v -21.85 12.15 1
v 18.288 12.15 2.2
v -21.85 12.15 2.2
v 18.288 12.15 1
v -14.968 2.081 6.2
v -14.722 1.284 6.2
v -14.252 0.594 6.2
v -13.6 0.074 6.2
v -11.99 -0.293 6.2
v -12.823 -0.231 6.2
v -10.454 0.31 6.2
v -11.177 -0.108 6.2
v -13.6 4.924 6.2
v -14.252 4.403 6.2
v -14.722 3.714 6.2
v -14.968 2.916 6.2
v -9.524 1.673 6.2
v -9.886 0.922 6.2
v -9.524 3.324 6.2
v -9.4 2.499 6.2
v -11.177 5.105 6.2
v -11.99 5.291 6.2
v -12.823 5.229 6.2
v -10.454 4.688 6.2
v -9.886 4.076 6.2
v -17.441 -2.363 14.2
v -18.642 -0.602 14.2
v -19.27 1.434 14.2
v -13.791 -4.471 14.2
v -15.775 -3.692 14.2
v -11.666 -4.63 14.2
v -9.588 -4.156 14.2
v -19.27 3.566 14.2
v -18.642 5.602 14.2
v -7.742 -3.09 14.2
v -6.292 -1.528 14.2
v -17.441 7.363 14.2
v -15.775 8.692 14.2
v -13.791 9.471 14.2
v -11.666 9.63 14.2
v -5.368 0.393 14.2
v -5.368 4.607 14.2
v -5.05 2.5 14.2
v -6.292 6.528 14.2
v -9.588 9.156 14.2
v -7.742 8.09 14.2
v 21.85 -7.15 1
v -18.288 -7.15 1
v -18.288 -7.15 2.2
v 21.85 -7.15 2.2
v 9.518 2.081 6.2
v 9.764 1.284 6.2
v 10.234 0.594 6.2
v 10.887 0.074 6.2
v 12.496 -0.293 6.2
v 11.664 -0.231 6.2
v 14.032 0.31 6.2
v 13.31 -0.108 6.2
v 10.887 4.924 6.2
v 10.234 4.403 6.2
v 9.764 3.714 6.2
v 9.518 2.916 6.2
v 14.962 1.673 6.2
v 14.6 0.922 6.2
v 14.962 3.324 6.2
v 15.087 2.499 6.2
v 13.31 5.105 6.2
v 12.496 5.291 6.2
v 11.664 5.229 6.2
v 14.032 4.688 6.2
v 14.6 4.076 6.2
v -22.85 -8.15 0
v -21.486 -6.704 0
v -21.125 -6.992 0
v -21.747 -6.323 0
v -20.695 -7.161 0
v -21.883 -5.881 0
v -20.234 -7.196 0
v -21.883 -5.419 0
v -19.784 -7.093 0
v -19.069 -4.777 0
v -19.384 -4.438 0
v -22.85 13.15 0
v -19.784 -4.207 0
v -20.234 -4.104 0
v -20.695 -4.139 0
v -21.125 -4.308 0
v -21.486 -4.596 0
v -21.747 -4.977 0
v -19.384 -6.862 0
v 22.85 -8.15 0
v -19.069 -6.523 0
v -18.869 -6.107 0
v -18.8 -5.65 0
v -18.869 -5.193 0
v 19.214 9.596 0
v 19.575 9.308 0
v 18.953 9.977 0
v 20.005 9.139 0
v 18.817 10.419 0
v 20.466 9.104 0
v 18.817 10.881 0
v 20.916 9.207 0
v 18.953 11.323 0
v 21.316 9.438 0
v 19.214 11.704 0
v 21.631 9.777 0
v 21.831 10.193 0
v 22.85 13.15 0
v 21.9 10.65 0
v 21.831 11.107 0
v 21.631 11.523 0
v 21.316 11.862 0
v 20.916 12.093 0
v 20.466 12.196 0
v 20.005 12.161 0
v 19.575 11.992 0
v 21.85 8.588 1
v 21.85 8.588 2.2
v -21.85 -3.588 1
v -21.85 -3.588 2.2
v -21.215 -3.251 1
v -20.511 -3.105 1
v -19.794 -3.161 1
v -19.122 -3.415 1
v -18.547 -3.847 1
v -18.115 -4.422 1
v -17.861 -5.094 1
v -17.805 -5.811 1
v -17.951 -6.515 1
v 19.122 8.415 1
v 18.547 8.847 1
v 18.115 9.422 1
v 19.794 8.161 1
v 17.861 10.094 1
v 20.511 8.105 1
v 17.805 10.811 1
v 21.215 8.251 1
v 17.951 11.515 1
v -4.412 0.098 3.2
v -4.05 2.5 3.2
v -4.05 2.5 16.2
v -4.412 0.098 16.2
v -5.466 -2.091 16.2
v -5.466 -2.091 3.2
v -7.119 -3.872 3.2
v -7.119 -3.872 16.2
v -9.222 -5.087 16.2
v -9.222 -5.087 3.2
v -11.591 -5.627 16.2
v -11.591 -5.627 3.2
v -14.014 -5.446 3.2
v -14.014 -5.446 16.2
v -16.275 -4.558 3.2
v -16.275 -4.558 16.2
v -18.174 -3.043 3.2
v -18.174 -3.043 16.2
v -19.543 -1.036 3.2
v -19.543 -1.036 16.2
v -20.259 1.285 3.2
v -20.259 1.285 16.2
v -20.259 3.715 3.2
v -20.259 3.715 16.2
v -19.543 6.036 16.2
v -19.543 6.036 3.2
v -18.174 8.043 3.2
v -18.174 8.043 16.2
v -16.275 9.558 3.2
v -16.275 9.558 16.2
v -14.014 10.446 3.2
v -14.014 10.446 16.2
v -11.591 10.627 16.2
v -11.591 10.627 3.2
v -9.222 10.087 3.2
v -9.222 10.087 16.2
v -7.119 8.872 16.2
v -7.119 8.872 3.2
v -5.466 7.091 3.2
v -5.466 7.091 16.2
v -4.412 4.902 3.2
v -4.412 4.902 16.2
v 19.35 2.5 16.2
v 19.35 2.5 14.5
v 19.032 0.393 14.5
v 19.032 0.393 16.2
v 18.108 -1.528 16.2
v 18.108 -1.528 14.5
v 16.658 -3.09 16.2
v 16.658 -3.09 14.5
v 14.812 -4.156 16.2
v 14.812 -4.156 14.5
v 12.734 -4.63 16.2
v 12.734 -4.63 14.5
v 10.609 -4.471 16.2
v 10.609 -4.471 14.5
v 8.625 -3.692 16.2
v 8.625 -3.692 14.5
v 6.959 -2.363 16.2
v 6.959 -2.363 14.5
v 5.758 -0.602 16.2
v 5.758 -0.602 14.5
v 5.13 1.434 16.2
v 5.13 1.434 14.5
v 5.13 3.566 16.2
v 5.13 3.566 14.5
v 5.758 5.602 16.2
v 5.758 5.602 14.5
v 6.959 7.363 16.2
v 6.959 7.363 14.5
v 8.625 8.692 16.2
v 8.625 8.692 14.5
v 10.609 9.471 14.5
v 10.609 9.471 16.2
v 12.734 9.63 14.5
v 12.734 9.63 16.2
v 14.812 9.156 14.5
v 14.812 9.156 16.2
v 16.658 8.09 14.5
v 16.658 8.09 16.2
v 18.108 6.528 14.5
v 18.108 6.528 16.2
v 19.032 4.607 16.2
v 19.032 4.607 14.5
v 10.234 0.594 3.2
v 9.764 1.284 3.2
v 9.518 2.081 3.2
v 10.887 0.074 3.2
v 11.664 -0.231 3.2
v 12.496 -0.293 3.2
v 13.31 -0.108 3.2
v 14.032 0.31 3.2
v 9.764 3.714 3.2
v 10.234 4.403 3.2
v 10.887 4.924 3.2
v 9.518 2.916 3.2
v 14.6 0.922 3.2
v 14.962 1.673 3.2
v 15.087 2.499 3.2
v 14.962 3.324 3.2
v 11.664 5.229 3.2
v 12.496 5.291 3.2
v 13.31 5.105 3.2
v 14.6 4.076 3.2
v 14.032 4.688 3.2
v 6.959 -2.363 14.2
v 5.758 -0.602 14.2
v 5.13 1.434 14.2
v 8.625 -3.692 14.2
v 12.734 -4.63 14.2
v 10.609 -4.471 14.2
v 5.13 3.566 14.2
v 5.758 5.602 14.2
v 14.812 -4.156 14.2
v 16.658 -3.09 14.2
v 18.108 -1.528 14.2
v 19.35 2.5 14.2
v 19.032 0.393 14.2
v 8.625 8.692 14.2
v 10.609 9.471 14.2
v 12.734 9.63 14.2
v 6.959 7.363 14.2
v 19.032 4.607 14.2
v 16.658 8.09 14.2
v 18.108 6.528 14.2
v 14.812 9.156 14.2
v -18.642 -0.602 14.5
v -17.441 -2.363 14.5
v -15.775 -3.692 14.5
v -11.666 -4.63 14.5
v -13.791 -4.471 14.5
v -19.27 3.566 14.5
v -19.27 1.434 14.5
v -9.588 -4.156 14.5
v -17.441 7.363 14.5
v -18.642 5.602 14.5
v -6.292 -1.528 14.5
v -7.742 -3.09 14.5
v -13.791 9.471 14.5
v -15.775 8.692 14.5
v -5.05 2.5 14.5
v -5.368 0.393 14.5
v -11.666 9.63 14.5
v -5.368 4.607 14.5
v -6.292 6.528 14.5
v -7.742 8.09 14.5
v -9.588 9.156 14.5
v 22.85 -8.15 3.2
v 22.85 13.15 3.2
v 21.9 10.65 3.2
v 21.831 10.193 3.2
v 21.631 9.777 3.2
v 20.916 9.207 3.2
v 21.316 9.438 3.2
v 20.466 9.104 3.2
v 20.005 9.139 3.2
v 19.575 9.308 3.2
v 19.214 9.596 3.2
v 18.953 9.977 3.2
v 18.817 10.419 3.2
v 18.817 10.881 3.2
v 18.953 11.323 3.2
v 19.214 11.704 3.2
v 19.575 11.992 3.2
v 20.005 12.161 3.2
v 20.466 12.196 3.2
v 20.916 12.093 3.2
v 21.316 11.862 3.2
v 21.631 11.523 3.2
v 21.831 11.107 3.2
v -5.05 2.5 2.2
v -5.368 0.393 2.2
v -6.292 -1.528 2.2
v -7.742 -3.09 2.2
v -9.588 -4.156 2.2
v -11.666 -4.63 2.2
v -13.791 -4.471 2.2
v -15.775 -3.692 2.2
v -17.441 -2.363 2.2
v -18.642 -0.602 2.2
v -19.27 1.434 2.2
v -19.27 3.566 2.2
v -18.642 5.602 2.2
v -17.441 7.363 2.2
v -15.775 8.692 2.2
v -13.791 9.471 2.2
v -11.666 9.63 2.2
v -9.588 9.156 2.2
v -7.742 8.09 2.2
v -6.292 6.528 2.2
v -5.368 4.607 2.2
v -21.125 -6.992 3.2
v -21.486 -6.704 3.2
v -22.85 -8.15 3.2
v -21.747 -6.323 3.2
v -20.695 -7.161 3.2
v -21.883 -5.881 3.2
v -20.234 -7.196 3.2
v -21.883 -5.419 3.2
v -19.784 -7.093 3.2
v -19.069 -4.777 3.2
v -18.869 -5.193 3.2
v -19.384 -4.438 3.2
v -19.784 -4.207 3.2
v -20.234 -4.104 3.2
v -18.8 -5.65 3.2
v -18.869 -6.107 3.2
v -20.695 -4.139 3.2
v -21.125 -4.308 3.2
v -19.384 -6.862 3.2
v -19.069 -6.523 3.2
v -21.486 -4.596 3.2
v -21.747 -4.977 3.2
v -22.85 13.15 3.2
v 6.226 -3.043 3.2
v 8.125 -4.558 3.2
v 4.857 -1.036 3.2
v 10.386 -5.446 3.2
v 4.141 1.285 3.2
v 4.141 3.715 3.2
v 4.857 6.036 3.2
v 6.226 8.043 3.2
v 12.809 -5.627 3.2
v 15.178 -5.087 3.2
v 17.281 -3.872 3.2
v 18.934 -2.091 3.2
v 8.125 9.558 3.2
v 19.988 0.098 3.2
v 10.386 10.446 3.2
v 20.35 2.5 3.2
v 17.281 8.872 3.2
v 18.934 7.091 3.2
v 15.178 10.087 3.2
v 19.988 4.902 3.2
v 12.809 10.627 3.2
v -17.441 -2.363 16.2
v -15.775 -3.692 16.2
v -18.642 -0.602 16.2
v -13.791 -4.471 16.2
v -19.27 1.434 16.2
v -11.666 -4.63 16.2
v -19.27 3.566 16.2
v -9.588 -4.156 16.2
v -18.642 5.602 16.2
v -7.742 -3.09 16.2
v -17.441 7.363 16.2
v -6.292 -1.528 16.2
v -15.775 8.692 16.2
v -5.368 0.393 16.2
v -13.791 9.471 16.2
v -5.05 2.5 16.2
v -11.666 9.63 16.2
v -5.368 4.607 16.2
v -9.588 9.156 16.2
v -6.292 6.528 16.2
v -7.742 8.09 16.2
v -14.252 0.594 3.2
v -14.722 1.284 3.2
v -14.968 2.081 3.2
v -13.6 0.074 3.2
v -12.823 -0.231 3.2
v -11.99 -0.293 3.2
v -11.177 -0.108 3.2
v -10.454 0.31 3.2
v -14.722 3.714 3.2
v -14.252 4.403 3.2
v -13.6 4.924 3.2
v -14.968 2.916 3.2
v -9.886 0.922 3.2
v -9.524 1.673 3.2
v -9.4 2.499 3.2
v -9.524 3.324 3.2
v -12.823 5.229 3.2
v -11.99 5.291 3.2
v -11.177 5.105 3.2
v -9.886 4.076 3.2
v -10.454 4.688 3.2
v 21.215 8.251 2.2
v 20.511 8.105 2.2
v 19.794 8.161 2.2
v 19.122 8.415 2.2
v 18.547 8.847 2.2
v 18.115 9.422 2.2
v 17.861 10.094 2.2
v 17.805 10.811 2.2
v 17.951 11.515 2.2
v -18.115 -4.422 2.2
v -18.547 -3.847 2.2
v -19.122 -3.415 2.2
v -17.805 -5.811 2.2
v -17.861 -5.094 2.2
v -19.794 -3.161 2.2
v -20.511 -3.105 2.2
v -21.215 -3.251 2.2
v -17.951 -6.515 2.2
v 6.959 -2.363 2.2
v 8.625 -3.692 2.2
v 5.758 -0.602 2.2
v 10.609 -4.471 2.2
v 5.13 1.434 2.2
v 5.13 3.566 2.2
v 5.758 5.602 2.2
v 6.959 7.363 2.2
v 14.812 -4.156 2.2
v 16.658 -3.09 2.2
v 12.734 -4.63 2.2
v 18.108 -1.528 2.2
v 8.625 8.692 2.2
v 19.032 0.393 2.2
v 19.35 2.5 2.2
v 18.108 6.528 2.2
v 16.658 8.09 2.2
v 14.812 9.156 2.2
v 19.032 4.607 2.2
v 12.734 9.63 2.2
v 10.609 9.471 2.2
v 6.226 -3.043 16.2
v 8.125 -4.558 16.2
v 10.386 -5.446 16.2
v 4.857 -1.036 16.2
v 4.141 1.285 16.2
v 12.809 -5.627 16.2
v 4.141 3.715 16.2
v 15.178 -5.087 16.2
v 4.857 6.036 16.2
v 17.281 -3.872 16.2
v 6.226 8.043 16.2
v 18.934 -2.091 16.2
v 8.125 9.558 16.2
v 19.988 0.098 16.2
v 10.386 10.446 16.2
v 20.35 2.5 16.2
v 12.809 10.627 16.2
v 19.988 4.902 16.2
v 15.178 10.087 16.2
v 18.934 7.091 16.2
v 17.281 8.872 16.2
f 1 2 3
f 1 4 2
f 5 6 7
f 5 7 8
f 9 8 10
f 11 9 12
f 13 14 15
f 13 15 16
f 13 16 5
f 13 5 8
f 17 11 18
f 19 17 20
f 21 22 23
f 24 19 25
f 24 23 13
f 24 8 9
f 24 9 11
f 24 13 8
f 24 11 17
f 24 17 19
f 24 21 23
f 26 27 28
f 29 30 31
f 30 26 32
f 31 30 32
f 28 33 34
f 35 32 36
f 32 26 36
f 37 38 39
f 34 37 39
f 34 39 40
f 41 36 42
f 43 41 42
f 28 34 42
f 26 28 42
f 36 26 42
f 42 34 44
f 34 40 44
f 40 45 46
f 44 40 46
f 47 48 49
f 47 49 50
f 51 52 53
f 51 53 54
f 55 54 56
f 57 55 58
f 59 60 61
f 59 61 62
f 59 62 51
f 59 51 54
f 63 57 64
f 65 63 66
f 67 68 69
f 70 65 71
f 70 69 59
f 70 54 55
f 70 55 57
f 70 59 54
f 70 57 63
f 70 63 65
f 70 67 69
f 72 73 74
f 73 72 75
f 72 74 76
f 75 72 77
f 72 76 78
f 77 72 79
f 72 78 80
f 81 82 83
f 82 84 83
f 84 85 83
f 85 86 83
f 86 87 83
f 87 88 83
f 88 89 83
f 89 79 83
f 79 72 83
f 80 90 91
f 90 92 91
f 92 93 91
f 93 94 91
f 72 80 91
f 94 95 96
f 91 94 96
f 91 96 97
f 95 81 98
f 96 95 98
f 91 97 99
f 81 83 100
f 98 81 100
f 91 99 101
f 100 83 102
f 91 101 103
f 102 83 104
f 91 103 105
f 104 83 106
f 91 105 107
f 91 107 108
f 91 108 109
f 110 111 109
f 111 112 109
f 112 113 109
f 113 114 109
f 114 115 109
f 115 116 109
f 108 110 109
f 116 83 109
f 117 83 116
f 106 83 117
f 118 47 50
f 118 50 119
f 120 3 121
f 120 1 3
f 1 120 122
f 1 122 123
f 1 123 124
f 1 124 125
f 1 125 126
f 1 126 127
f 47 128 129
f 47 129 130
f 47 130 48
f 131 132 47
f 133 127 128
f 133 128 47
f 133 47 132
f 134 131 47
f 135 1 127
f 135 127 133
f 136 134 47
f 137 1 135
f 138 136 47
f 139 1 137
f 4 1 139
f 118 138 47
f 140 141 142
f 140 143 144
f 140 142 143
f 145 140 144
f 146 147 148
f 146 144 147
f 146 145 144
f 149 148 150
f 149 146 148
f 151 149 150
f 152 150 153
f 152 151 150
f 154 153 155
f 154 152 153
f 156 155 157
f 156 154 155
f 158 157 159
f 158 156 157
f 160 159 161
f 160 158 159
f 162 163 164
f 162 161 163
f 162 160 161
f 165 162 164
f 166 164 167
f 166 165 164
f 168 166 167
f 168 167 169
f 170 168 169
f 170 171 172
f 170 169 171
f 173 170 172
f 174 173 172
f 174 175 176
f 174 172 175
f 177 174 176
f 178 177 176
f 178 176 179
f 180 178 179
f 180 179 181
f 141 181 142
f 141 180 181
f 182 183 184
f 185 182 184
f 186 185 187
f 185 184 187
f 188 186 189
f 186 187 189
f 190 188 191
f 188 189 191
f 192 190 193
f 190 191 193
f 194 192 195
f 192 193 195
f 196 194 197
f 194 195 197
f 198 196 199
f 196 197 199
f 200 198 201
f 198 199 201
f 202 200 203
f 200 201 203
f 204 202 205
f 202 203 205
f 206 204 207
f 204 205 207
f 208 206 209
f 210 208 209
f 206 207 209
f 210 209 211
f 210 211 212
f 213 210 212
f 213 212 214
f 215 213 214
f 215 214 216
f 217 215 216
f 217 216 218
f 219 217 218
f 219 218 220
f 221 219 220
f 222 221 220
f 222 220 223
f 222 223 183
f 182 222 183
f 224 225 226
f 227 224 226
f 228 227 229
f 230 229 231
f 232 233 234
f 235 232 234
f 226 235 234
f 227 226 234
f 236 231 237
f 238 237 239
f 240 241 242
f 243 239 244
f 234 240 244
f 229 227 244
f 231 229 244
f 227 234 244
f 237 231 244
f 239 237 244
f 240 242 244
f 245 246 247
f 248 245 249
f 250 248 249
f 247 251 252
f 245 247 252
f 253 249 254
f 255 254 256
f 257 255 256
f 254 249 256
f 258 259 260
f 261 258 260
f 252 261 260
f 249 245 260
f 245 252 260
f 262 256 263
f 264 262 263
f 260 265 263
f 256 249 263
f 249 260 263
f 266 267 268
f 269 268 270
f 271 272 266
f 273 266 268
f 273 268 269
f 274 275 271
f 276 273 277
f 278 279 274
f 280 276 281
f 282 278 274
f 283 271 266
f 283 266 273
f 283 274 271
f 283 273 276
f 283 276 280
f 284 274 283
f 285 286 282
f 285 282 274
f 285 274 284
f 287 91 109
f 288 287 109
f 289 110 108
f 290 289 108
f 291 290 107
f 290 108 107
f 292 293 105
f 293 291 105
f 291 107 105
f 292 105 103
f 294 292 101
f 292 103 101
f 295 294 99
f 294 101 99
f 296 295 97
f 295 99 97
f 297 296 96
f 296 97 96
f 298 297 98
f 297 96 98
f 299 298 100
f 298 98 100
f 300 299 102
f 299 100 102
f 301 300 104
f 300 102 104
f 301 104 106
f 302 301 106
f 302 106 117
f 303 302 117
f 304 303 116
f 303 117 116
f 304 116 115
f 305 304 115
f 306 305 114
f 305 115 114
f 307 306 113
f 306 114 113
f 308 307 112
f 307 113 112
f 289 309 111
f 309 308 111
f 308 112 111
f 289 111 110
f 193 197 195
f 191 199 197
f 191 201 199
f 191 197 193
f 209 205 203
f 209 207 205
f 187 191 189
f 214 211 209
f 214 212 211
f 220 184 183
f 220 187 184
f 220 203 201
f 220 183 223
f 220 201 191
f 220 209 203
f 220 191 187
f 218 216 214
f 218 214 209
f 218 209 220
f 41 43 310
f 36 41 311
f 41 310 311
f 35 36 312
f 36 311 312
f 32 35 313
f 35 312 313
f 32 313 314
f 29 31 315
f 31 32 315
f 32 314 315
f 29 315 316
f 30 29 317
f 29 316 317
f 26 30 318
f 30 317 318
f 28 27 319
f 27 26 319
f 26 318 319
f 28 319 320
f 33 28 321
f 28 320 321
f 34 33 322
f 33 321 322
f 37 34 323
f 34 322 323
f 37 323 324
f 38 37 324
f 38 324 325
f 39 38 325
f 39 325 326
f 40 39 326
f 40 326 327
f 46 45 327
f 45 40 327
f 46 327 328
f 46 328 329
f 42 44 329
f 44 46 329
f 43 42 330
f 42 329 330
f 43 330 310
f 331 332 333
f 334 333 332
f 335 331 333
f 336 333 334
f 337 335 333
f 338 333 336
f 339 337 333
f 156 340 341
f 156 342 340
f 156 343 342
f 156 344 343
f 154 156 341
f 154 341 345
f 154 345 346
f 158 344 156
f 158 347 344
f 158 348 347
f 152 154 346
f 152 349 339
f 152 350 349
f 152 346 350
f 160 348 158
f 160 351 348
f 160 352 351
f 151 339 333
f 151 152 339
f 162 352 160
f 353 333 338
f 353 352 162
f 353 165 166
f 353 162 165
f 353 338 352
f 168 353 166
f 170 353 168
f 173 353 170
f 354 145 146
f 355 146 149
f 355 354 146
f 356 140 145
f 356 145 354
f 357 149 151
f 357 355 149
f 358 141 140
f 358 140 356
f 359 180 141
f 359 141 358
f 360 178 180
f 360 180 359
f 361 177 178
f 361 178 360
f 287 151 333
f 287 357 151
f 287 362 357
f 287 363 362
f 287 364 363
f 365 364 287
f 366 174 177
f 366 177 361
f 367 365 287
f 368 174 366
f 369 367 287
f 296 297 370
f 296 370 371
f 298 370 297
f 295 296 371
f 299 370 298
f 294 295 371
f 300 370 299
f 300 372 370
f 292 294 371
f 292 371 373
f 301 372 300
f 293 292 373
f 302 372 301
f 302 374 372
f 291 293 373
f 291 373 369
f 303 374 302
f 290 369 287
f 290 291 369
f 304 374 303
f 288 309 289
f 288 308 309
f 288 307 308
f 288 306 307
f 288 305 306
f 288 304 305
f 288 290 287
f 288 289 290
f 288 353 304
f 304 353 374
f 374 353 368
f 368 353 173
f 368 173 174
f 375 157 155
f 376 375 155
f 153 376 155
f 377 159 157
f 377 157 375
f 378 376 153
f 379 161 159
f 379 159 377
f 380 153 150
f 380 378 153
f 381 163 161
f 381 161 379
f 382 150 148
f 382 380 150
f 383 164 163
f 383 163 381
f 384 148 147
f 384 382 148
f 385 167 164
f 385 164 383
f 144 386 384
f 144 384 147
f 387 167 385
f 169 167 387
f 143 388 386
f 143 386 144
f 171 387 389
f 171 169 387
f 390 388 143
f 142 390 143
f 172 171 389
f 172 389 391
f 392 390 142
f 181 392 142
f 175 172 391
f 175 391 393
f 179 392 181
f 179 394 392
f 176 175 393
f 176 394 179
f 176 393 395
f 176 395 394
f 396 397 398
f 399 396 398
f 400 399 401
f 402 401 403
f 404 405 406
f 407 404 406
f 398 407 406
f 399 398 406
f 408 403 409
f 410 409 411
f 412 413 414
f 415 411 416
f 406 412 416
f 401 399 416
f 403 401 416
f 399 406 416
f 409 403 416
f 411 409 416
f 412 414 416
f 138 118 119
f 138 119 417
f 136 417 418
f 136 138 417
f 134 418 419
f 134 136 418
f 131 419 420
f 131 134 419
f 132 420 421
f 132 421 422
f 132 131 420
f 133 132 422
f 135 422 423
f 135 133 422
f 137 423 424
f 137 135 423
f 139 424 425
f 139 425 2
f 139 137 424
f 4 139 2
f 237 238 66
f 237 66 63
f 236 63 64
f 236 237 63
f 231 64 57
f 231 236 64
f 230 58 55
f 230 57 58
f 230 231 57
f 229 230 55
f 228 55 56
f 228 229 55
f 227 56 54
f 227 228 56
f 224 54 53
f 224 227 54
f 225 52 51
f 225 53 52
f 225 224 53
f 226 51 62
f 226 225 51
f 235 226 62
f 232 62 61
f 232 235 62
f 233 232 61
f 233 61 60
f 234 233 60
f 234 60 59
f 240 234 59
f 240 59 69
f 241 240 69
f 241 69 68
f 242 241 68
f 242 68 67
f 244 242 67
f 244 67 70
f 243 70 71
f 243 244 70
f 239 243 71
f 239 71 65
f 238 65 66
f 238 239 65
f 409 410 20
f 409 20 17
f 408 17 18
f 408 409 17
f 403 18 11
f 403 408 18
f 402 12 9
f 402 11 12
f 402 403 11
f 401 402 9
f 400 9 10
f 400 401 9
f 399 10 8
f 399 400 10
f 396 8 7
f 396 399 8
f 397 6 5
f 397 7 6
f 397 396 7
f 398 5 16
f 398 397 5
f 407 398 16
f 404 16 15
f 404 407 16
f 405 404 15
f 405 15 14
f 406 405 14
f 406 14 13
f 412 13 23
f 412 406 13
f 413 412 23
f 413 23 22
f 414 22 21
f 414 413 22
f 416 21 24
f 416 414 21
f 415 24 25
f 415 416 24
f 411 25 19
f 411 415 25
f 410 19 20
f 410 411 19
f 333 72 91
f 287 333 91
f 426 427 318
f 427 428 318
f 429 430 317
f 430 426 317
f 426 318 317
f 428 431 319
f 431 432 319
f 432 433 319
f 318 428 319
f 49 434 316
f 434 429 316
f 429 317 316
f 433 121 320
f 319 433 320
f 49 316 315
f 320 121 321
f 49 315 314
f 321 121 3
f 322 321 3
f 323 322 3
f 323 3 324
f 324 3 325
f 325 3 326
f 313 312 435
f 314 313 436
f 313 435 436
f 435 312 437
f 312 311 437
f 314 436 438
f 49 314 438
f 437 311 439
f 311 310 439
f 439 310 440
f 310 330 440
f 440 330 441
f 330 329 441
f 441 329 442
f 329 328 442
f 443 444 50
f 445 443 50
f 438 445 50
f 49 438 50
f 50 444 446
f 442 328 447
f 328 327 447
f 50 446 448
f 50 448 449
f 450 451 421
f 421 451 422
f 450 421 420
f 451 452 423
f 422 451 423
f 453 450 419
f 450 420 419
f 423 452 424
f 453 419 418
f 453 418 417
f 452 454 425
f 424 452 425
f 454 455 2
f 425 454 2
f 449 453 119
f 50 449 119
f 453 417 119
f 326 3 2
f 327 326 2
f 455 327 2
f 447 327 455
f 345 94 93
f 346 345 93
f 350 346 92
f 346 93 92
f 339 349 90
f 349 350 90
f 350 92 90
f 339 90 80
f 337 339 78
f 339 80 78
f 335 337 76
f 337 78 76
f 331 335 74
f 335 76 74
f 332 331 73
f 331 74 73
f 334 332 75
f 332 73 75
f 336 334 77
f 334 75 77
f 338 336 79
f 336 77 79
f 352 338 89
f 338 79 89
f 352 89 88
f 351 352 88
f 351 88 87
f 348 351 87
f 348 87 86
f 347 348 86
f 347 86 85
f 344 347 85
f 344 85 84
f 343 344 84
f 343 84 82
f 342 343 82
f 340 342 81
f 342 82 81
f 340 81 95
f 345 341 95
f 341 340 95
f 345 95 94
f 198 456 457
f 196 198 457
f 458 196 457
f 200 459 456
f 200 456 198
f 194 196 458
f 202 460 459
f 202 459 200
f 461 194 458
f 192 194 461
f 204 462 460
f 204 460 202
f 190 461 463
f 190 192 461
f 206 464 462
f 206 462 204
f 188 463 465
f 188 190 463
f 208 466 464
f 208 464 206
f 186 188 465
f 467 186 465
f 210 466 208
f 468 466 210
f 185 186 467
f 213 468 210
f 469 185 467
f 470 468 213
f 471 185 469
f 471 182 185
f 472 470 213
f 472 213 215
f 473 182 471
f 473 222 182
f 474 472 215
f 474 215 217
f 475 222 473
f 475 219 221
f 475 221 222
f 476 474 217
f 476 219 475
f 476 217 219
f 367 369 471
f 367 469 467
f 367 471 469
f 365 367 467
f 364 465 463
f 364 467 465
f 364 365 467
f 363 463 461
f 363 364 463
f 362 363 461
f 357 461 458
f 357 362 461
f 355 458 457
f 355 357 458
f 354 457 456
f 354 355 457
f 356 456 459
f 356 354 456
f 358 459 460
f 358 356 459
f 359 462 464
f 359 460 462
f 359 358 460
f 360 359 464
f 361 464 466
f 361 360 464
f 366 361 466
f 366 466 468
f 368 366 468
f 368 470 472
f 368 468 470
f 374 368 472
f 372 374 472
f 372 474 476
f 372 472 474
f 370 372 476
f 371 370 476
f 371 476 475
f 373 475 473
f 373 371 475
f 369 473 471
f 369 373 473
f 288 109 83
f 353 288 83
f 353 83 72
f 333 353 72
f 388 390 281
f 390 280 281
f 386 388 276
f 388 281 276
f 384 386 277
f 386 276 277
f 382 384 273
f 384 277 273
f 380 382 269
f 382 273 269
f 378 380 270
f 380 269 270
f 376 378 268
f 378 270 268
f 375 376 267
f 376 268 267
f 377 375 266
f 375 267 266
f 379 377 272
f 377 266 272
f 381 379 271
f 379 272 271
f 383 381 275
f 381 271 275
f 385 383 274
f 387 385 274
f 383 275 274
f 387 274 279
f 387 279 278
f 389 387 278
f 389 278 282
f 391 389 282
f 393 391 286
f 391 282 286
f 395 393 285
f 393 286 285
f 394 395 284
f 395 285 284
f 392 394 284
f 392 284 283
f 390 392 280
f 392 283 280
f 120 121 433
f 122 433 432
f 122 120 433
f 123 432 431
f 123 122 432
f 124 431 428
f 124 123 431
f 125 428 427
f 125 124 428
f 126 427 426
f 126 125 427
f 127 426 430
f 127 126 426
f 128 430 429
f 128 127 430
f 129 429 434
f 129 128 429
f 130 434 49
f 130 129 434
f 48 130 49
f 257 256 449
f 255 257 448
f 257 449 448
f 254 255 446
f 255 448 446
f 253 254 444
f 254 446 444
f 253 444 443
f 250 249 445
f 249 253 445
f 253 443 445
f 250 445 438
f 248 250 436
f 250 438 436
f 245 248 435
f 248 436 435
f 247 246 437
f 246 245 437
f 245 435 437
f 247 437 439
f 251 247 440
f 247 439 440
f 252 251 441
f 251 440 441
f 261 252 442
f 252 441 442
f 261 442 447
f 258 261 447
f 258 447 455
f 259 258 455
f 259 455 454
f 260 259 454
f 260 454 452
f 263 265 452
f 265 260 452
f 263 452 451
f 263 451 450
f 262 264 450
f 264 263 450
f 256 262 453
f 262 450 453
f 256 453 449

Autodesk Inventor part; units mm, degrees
ref_plane "YZ Plane" through (0, 0, 0) normal (1, 0, 0) x (0, 1, 0)
ref_plane "XZ Plane" through (0, 0, 0) normal (0, 1, 0) x (-1, 0, 0)
sketch "スケッチ1" plane through (0, 0, 0) normal (0, 0, 1) x (1, 0, 0)
  line L0 (22.85, 13.15) -> (-22.85, 13.15)
  line L1 (-22.85, 13.15) -> (-22.85, -8.15)
  line L2 (-22.85, -8.15) -> (22.85, -8.15)
  line L3 (22.85, -8.15) -> (22.85, 13.15)
  circle A0 centre (20.35, 10.65) radius 1.55
  circle A1 centre (-20.35, -5.65) radius 1.55
  circle A2 centre (12.2, 2.5) radius 8.15
  circle A3 centre (-12.2, 2.5) radius 8.15
  line L4 (-2.5, -13.15) -> (-2.5, -8.15)
  line L5 (0, -8.15) -> (0, -13.15)
  line L6 (2.5, -13.15) -> (2.5, -8.15)
  point P0 (0, 0)
extrude "押し出し1" add sketch "スケッチ1" along normal blind 3.2 contours L3 L2 L1 L0 | A2 | A3
sketch "スケッチ2" plane through (0, 0, 3.2) normal (0, 0, 1) x (1, 0, 0)
  line L0 (22.85, 13.15) -> (-22.85, 13.15)
  line L1 (-22.85, 13.15) -> (-22.85, -8.15)
  line L2 (-22.85, -8.15) -> (22.85, -8.15)
  line L3 (22.85, -8.15) -> (22.85, 13.15)
  circle A0 centre (20.35, 10.65) radius 1.55
  circle A1 centre (-20.35, -5.65) radius 1.55
  circle A2 centre (12.2, 2.5) radius 8.15
  circle A3 centre (-12.2, 2.5) radius 8.15
  line L4 (-2.5, -13.15) -> (-2.5, -8.15)
  line L5 (0, -8.15) -> (0, -13.15)
  line L6 (2.5, -13.15) -> (2.5, -8.15)
  point P0 (0, 0)
extrude "押し出し2" add sketch "スケッチ2" along normal blind 13 contours A2 | A3
shell "シェル1" thickness 1 removed faces 2 at (-11.3117, 0.2642, 16.2) at (12.9427, 4.4582, 16.2)
ref_plane "作業平面2" through (0, 0, 14.2) normal (0, 0, 1) x (1, 0, 0)
sketch "スケッチ6" plane through (0, 0, 14.2) normal (0, 0, 1) x (1, 0, 0)
  circle A0 centre (-12.2, 2.5) radius 7.15 projected
  line L0 (-19.35, 2.5) -> (-5.05, 2.5)
  circle A1 centre (-12.2, 2.5) radius 7.15
  line L1 (-19.052, 4.5426) -> (-5.3543, 4.5637)
  line L2 (-18.3489, 6.1487) -> (-5.9959, 6.0541)
  line L3 (-17.2114, 7.5999) -> (-7.2004, 7.6115)
  line L4 (-19.1499, 0.8202) -> (-5.2376, 0.8727)
  line L5 (-18.534, -0.8171) -> (-5.6692, -0.4105)
  line L6 (-17.3855, -2.4227) -> (-7.0375, -2.4468)
  line L7 (-16.0004, -3.5563) -> (-8.3492, -3.5245)
  line L8 (-17.2114, 7.5999) -> (-17.3855, -2.4227)
  line L9 (-14.4249, 9.295) -> (-14.3135, -4.3305)
  line L10 (-13.1954, 9.5804) -> (-13.1455, -4.5872)
  line L11 (-11.4954, 9.6152) -> (-11.3318, -4.5971)
  line L12 (-12.4363, 9.6461) -> (-12.1311, -4.6497)
  line L13 (-10.5067, 9.4466) -> (-10.5519, -4.4575)
  line L14 (-9.4473, 9.0989) -> (-9.235, -4.0063)
  line L15 (-8.5464, 8.646) -> (-8.3492, -3.5245)
  line L16 (-7.2004, 7.6115) -> (-7.0375, -2.4468)
  line L17 (-6.2491, 6.4635) -> (-6.0315, -0.4219)
  line L18 (-5.3543, 4.5637) -> (-5.2376, 0.8727)
  line L19 (-16.2779, 8.3731) -> (-16.2973, -3.3596)
  line L20 (-15.5086, 8.8384) -> (-15.311, -3.9377)
  line L21 (-15.5086, 8.8384) -> (-8.1551, 8.3959)
  line L22 (-19.2523, 3.678) -> (-5.1166, 3.4733)
  line L23 (-19.2938, 1.605) -> (-5.0932, 1.7148)
  line L24 (-18.0596, 6.5972) -> (-18.2101, -1.3732)
  line L25 (-18.8956, -0.0083) -> (-5.4358, 0.183)
  line L26 (-17.9612, -1.7345) -> (-6.2041, -1.3951)
  line L27 (-6.0315, -0.4219) -> (-6.2041, -1.3951)
  point P0 (0, 0)
sketch "スケッチ7" plane through (0, 0, 14.2) normal (0, 0, 1) x (1, 0, 0)
  circle A0 centre (-12.2, 2.5) radius 7.15 projected
  line L0 (-19.35, 2.5) -> (-12.2, 2.5)
  circle A1 centre (-12.2, 2.5) radius 7.15
  circle A2 centre (12.2, 2.5) radius 7.15 projected
  line L1 (5.05, 2.5) -> (12.2, 2.5)
  circle A3 centre (12.2, 2.5) radius 7.15
  point P0 (0, 0)
sketch "スケッチ8" plane through (0, 0, 3.2) normal (0, 0, 1) x (1, 0, 0)
  circle A0 centre (-12.1996, 2.4988) radius 2.8
  circle A1 centre (12.2866, 2.4988) radius 2.8
  point P0 (0, 0)
  dimension "d8" = 5.6
  dimension "d9" = 5.6
extrude "押し出し4" add sketch "スケッチ8" along normal blind 3
extrude "押し出し5" add sketch "スケッチ7" along normal blind 0.3
properties part number "ping"
